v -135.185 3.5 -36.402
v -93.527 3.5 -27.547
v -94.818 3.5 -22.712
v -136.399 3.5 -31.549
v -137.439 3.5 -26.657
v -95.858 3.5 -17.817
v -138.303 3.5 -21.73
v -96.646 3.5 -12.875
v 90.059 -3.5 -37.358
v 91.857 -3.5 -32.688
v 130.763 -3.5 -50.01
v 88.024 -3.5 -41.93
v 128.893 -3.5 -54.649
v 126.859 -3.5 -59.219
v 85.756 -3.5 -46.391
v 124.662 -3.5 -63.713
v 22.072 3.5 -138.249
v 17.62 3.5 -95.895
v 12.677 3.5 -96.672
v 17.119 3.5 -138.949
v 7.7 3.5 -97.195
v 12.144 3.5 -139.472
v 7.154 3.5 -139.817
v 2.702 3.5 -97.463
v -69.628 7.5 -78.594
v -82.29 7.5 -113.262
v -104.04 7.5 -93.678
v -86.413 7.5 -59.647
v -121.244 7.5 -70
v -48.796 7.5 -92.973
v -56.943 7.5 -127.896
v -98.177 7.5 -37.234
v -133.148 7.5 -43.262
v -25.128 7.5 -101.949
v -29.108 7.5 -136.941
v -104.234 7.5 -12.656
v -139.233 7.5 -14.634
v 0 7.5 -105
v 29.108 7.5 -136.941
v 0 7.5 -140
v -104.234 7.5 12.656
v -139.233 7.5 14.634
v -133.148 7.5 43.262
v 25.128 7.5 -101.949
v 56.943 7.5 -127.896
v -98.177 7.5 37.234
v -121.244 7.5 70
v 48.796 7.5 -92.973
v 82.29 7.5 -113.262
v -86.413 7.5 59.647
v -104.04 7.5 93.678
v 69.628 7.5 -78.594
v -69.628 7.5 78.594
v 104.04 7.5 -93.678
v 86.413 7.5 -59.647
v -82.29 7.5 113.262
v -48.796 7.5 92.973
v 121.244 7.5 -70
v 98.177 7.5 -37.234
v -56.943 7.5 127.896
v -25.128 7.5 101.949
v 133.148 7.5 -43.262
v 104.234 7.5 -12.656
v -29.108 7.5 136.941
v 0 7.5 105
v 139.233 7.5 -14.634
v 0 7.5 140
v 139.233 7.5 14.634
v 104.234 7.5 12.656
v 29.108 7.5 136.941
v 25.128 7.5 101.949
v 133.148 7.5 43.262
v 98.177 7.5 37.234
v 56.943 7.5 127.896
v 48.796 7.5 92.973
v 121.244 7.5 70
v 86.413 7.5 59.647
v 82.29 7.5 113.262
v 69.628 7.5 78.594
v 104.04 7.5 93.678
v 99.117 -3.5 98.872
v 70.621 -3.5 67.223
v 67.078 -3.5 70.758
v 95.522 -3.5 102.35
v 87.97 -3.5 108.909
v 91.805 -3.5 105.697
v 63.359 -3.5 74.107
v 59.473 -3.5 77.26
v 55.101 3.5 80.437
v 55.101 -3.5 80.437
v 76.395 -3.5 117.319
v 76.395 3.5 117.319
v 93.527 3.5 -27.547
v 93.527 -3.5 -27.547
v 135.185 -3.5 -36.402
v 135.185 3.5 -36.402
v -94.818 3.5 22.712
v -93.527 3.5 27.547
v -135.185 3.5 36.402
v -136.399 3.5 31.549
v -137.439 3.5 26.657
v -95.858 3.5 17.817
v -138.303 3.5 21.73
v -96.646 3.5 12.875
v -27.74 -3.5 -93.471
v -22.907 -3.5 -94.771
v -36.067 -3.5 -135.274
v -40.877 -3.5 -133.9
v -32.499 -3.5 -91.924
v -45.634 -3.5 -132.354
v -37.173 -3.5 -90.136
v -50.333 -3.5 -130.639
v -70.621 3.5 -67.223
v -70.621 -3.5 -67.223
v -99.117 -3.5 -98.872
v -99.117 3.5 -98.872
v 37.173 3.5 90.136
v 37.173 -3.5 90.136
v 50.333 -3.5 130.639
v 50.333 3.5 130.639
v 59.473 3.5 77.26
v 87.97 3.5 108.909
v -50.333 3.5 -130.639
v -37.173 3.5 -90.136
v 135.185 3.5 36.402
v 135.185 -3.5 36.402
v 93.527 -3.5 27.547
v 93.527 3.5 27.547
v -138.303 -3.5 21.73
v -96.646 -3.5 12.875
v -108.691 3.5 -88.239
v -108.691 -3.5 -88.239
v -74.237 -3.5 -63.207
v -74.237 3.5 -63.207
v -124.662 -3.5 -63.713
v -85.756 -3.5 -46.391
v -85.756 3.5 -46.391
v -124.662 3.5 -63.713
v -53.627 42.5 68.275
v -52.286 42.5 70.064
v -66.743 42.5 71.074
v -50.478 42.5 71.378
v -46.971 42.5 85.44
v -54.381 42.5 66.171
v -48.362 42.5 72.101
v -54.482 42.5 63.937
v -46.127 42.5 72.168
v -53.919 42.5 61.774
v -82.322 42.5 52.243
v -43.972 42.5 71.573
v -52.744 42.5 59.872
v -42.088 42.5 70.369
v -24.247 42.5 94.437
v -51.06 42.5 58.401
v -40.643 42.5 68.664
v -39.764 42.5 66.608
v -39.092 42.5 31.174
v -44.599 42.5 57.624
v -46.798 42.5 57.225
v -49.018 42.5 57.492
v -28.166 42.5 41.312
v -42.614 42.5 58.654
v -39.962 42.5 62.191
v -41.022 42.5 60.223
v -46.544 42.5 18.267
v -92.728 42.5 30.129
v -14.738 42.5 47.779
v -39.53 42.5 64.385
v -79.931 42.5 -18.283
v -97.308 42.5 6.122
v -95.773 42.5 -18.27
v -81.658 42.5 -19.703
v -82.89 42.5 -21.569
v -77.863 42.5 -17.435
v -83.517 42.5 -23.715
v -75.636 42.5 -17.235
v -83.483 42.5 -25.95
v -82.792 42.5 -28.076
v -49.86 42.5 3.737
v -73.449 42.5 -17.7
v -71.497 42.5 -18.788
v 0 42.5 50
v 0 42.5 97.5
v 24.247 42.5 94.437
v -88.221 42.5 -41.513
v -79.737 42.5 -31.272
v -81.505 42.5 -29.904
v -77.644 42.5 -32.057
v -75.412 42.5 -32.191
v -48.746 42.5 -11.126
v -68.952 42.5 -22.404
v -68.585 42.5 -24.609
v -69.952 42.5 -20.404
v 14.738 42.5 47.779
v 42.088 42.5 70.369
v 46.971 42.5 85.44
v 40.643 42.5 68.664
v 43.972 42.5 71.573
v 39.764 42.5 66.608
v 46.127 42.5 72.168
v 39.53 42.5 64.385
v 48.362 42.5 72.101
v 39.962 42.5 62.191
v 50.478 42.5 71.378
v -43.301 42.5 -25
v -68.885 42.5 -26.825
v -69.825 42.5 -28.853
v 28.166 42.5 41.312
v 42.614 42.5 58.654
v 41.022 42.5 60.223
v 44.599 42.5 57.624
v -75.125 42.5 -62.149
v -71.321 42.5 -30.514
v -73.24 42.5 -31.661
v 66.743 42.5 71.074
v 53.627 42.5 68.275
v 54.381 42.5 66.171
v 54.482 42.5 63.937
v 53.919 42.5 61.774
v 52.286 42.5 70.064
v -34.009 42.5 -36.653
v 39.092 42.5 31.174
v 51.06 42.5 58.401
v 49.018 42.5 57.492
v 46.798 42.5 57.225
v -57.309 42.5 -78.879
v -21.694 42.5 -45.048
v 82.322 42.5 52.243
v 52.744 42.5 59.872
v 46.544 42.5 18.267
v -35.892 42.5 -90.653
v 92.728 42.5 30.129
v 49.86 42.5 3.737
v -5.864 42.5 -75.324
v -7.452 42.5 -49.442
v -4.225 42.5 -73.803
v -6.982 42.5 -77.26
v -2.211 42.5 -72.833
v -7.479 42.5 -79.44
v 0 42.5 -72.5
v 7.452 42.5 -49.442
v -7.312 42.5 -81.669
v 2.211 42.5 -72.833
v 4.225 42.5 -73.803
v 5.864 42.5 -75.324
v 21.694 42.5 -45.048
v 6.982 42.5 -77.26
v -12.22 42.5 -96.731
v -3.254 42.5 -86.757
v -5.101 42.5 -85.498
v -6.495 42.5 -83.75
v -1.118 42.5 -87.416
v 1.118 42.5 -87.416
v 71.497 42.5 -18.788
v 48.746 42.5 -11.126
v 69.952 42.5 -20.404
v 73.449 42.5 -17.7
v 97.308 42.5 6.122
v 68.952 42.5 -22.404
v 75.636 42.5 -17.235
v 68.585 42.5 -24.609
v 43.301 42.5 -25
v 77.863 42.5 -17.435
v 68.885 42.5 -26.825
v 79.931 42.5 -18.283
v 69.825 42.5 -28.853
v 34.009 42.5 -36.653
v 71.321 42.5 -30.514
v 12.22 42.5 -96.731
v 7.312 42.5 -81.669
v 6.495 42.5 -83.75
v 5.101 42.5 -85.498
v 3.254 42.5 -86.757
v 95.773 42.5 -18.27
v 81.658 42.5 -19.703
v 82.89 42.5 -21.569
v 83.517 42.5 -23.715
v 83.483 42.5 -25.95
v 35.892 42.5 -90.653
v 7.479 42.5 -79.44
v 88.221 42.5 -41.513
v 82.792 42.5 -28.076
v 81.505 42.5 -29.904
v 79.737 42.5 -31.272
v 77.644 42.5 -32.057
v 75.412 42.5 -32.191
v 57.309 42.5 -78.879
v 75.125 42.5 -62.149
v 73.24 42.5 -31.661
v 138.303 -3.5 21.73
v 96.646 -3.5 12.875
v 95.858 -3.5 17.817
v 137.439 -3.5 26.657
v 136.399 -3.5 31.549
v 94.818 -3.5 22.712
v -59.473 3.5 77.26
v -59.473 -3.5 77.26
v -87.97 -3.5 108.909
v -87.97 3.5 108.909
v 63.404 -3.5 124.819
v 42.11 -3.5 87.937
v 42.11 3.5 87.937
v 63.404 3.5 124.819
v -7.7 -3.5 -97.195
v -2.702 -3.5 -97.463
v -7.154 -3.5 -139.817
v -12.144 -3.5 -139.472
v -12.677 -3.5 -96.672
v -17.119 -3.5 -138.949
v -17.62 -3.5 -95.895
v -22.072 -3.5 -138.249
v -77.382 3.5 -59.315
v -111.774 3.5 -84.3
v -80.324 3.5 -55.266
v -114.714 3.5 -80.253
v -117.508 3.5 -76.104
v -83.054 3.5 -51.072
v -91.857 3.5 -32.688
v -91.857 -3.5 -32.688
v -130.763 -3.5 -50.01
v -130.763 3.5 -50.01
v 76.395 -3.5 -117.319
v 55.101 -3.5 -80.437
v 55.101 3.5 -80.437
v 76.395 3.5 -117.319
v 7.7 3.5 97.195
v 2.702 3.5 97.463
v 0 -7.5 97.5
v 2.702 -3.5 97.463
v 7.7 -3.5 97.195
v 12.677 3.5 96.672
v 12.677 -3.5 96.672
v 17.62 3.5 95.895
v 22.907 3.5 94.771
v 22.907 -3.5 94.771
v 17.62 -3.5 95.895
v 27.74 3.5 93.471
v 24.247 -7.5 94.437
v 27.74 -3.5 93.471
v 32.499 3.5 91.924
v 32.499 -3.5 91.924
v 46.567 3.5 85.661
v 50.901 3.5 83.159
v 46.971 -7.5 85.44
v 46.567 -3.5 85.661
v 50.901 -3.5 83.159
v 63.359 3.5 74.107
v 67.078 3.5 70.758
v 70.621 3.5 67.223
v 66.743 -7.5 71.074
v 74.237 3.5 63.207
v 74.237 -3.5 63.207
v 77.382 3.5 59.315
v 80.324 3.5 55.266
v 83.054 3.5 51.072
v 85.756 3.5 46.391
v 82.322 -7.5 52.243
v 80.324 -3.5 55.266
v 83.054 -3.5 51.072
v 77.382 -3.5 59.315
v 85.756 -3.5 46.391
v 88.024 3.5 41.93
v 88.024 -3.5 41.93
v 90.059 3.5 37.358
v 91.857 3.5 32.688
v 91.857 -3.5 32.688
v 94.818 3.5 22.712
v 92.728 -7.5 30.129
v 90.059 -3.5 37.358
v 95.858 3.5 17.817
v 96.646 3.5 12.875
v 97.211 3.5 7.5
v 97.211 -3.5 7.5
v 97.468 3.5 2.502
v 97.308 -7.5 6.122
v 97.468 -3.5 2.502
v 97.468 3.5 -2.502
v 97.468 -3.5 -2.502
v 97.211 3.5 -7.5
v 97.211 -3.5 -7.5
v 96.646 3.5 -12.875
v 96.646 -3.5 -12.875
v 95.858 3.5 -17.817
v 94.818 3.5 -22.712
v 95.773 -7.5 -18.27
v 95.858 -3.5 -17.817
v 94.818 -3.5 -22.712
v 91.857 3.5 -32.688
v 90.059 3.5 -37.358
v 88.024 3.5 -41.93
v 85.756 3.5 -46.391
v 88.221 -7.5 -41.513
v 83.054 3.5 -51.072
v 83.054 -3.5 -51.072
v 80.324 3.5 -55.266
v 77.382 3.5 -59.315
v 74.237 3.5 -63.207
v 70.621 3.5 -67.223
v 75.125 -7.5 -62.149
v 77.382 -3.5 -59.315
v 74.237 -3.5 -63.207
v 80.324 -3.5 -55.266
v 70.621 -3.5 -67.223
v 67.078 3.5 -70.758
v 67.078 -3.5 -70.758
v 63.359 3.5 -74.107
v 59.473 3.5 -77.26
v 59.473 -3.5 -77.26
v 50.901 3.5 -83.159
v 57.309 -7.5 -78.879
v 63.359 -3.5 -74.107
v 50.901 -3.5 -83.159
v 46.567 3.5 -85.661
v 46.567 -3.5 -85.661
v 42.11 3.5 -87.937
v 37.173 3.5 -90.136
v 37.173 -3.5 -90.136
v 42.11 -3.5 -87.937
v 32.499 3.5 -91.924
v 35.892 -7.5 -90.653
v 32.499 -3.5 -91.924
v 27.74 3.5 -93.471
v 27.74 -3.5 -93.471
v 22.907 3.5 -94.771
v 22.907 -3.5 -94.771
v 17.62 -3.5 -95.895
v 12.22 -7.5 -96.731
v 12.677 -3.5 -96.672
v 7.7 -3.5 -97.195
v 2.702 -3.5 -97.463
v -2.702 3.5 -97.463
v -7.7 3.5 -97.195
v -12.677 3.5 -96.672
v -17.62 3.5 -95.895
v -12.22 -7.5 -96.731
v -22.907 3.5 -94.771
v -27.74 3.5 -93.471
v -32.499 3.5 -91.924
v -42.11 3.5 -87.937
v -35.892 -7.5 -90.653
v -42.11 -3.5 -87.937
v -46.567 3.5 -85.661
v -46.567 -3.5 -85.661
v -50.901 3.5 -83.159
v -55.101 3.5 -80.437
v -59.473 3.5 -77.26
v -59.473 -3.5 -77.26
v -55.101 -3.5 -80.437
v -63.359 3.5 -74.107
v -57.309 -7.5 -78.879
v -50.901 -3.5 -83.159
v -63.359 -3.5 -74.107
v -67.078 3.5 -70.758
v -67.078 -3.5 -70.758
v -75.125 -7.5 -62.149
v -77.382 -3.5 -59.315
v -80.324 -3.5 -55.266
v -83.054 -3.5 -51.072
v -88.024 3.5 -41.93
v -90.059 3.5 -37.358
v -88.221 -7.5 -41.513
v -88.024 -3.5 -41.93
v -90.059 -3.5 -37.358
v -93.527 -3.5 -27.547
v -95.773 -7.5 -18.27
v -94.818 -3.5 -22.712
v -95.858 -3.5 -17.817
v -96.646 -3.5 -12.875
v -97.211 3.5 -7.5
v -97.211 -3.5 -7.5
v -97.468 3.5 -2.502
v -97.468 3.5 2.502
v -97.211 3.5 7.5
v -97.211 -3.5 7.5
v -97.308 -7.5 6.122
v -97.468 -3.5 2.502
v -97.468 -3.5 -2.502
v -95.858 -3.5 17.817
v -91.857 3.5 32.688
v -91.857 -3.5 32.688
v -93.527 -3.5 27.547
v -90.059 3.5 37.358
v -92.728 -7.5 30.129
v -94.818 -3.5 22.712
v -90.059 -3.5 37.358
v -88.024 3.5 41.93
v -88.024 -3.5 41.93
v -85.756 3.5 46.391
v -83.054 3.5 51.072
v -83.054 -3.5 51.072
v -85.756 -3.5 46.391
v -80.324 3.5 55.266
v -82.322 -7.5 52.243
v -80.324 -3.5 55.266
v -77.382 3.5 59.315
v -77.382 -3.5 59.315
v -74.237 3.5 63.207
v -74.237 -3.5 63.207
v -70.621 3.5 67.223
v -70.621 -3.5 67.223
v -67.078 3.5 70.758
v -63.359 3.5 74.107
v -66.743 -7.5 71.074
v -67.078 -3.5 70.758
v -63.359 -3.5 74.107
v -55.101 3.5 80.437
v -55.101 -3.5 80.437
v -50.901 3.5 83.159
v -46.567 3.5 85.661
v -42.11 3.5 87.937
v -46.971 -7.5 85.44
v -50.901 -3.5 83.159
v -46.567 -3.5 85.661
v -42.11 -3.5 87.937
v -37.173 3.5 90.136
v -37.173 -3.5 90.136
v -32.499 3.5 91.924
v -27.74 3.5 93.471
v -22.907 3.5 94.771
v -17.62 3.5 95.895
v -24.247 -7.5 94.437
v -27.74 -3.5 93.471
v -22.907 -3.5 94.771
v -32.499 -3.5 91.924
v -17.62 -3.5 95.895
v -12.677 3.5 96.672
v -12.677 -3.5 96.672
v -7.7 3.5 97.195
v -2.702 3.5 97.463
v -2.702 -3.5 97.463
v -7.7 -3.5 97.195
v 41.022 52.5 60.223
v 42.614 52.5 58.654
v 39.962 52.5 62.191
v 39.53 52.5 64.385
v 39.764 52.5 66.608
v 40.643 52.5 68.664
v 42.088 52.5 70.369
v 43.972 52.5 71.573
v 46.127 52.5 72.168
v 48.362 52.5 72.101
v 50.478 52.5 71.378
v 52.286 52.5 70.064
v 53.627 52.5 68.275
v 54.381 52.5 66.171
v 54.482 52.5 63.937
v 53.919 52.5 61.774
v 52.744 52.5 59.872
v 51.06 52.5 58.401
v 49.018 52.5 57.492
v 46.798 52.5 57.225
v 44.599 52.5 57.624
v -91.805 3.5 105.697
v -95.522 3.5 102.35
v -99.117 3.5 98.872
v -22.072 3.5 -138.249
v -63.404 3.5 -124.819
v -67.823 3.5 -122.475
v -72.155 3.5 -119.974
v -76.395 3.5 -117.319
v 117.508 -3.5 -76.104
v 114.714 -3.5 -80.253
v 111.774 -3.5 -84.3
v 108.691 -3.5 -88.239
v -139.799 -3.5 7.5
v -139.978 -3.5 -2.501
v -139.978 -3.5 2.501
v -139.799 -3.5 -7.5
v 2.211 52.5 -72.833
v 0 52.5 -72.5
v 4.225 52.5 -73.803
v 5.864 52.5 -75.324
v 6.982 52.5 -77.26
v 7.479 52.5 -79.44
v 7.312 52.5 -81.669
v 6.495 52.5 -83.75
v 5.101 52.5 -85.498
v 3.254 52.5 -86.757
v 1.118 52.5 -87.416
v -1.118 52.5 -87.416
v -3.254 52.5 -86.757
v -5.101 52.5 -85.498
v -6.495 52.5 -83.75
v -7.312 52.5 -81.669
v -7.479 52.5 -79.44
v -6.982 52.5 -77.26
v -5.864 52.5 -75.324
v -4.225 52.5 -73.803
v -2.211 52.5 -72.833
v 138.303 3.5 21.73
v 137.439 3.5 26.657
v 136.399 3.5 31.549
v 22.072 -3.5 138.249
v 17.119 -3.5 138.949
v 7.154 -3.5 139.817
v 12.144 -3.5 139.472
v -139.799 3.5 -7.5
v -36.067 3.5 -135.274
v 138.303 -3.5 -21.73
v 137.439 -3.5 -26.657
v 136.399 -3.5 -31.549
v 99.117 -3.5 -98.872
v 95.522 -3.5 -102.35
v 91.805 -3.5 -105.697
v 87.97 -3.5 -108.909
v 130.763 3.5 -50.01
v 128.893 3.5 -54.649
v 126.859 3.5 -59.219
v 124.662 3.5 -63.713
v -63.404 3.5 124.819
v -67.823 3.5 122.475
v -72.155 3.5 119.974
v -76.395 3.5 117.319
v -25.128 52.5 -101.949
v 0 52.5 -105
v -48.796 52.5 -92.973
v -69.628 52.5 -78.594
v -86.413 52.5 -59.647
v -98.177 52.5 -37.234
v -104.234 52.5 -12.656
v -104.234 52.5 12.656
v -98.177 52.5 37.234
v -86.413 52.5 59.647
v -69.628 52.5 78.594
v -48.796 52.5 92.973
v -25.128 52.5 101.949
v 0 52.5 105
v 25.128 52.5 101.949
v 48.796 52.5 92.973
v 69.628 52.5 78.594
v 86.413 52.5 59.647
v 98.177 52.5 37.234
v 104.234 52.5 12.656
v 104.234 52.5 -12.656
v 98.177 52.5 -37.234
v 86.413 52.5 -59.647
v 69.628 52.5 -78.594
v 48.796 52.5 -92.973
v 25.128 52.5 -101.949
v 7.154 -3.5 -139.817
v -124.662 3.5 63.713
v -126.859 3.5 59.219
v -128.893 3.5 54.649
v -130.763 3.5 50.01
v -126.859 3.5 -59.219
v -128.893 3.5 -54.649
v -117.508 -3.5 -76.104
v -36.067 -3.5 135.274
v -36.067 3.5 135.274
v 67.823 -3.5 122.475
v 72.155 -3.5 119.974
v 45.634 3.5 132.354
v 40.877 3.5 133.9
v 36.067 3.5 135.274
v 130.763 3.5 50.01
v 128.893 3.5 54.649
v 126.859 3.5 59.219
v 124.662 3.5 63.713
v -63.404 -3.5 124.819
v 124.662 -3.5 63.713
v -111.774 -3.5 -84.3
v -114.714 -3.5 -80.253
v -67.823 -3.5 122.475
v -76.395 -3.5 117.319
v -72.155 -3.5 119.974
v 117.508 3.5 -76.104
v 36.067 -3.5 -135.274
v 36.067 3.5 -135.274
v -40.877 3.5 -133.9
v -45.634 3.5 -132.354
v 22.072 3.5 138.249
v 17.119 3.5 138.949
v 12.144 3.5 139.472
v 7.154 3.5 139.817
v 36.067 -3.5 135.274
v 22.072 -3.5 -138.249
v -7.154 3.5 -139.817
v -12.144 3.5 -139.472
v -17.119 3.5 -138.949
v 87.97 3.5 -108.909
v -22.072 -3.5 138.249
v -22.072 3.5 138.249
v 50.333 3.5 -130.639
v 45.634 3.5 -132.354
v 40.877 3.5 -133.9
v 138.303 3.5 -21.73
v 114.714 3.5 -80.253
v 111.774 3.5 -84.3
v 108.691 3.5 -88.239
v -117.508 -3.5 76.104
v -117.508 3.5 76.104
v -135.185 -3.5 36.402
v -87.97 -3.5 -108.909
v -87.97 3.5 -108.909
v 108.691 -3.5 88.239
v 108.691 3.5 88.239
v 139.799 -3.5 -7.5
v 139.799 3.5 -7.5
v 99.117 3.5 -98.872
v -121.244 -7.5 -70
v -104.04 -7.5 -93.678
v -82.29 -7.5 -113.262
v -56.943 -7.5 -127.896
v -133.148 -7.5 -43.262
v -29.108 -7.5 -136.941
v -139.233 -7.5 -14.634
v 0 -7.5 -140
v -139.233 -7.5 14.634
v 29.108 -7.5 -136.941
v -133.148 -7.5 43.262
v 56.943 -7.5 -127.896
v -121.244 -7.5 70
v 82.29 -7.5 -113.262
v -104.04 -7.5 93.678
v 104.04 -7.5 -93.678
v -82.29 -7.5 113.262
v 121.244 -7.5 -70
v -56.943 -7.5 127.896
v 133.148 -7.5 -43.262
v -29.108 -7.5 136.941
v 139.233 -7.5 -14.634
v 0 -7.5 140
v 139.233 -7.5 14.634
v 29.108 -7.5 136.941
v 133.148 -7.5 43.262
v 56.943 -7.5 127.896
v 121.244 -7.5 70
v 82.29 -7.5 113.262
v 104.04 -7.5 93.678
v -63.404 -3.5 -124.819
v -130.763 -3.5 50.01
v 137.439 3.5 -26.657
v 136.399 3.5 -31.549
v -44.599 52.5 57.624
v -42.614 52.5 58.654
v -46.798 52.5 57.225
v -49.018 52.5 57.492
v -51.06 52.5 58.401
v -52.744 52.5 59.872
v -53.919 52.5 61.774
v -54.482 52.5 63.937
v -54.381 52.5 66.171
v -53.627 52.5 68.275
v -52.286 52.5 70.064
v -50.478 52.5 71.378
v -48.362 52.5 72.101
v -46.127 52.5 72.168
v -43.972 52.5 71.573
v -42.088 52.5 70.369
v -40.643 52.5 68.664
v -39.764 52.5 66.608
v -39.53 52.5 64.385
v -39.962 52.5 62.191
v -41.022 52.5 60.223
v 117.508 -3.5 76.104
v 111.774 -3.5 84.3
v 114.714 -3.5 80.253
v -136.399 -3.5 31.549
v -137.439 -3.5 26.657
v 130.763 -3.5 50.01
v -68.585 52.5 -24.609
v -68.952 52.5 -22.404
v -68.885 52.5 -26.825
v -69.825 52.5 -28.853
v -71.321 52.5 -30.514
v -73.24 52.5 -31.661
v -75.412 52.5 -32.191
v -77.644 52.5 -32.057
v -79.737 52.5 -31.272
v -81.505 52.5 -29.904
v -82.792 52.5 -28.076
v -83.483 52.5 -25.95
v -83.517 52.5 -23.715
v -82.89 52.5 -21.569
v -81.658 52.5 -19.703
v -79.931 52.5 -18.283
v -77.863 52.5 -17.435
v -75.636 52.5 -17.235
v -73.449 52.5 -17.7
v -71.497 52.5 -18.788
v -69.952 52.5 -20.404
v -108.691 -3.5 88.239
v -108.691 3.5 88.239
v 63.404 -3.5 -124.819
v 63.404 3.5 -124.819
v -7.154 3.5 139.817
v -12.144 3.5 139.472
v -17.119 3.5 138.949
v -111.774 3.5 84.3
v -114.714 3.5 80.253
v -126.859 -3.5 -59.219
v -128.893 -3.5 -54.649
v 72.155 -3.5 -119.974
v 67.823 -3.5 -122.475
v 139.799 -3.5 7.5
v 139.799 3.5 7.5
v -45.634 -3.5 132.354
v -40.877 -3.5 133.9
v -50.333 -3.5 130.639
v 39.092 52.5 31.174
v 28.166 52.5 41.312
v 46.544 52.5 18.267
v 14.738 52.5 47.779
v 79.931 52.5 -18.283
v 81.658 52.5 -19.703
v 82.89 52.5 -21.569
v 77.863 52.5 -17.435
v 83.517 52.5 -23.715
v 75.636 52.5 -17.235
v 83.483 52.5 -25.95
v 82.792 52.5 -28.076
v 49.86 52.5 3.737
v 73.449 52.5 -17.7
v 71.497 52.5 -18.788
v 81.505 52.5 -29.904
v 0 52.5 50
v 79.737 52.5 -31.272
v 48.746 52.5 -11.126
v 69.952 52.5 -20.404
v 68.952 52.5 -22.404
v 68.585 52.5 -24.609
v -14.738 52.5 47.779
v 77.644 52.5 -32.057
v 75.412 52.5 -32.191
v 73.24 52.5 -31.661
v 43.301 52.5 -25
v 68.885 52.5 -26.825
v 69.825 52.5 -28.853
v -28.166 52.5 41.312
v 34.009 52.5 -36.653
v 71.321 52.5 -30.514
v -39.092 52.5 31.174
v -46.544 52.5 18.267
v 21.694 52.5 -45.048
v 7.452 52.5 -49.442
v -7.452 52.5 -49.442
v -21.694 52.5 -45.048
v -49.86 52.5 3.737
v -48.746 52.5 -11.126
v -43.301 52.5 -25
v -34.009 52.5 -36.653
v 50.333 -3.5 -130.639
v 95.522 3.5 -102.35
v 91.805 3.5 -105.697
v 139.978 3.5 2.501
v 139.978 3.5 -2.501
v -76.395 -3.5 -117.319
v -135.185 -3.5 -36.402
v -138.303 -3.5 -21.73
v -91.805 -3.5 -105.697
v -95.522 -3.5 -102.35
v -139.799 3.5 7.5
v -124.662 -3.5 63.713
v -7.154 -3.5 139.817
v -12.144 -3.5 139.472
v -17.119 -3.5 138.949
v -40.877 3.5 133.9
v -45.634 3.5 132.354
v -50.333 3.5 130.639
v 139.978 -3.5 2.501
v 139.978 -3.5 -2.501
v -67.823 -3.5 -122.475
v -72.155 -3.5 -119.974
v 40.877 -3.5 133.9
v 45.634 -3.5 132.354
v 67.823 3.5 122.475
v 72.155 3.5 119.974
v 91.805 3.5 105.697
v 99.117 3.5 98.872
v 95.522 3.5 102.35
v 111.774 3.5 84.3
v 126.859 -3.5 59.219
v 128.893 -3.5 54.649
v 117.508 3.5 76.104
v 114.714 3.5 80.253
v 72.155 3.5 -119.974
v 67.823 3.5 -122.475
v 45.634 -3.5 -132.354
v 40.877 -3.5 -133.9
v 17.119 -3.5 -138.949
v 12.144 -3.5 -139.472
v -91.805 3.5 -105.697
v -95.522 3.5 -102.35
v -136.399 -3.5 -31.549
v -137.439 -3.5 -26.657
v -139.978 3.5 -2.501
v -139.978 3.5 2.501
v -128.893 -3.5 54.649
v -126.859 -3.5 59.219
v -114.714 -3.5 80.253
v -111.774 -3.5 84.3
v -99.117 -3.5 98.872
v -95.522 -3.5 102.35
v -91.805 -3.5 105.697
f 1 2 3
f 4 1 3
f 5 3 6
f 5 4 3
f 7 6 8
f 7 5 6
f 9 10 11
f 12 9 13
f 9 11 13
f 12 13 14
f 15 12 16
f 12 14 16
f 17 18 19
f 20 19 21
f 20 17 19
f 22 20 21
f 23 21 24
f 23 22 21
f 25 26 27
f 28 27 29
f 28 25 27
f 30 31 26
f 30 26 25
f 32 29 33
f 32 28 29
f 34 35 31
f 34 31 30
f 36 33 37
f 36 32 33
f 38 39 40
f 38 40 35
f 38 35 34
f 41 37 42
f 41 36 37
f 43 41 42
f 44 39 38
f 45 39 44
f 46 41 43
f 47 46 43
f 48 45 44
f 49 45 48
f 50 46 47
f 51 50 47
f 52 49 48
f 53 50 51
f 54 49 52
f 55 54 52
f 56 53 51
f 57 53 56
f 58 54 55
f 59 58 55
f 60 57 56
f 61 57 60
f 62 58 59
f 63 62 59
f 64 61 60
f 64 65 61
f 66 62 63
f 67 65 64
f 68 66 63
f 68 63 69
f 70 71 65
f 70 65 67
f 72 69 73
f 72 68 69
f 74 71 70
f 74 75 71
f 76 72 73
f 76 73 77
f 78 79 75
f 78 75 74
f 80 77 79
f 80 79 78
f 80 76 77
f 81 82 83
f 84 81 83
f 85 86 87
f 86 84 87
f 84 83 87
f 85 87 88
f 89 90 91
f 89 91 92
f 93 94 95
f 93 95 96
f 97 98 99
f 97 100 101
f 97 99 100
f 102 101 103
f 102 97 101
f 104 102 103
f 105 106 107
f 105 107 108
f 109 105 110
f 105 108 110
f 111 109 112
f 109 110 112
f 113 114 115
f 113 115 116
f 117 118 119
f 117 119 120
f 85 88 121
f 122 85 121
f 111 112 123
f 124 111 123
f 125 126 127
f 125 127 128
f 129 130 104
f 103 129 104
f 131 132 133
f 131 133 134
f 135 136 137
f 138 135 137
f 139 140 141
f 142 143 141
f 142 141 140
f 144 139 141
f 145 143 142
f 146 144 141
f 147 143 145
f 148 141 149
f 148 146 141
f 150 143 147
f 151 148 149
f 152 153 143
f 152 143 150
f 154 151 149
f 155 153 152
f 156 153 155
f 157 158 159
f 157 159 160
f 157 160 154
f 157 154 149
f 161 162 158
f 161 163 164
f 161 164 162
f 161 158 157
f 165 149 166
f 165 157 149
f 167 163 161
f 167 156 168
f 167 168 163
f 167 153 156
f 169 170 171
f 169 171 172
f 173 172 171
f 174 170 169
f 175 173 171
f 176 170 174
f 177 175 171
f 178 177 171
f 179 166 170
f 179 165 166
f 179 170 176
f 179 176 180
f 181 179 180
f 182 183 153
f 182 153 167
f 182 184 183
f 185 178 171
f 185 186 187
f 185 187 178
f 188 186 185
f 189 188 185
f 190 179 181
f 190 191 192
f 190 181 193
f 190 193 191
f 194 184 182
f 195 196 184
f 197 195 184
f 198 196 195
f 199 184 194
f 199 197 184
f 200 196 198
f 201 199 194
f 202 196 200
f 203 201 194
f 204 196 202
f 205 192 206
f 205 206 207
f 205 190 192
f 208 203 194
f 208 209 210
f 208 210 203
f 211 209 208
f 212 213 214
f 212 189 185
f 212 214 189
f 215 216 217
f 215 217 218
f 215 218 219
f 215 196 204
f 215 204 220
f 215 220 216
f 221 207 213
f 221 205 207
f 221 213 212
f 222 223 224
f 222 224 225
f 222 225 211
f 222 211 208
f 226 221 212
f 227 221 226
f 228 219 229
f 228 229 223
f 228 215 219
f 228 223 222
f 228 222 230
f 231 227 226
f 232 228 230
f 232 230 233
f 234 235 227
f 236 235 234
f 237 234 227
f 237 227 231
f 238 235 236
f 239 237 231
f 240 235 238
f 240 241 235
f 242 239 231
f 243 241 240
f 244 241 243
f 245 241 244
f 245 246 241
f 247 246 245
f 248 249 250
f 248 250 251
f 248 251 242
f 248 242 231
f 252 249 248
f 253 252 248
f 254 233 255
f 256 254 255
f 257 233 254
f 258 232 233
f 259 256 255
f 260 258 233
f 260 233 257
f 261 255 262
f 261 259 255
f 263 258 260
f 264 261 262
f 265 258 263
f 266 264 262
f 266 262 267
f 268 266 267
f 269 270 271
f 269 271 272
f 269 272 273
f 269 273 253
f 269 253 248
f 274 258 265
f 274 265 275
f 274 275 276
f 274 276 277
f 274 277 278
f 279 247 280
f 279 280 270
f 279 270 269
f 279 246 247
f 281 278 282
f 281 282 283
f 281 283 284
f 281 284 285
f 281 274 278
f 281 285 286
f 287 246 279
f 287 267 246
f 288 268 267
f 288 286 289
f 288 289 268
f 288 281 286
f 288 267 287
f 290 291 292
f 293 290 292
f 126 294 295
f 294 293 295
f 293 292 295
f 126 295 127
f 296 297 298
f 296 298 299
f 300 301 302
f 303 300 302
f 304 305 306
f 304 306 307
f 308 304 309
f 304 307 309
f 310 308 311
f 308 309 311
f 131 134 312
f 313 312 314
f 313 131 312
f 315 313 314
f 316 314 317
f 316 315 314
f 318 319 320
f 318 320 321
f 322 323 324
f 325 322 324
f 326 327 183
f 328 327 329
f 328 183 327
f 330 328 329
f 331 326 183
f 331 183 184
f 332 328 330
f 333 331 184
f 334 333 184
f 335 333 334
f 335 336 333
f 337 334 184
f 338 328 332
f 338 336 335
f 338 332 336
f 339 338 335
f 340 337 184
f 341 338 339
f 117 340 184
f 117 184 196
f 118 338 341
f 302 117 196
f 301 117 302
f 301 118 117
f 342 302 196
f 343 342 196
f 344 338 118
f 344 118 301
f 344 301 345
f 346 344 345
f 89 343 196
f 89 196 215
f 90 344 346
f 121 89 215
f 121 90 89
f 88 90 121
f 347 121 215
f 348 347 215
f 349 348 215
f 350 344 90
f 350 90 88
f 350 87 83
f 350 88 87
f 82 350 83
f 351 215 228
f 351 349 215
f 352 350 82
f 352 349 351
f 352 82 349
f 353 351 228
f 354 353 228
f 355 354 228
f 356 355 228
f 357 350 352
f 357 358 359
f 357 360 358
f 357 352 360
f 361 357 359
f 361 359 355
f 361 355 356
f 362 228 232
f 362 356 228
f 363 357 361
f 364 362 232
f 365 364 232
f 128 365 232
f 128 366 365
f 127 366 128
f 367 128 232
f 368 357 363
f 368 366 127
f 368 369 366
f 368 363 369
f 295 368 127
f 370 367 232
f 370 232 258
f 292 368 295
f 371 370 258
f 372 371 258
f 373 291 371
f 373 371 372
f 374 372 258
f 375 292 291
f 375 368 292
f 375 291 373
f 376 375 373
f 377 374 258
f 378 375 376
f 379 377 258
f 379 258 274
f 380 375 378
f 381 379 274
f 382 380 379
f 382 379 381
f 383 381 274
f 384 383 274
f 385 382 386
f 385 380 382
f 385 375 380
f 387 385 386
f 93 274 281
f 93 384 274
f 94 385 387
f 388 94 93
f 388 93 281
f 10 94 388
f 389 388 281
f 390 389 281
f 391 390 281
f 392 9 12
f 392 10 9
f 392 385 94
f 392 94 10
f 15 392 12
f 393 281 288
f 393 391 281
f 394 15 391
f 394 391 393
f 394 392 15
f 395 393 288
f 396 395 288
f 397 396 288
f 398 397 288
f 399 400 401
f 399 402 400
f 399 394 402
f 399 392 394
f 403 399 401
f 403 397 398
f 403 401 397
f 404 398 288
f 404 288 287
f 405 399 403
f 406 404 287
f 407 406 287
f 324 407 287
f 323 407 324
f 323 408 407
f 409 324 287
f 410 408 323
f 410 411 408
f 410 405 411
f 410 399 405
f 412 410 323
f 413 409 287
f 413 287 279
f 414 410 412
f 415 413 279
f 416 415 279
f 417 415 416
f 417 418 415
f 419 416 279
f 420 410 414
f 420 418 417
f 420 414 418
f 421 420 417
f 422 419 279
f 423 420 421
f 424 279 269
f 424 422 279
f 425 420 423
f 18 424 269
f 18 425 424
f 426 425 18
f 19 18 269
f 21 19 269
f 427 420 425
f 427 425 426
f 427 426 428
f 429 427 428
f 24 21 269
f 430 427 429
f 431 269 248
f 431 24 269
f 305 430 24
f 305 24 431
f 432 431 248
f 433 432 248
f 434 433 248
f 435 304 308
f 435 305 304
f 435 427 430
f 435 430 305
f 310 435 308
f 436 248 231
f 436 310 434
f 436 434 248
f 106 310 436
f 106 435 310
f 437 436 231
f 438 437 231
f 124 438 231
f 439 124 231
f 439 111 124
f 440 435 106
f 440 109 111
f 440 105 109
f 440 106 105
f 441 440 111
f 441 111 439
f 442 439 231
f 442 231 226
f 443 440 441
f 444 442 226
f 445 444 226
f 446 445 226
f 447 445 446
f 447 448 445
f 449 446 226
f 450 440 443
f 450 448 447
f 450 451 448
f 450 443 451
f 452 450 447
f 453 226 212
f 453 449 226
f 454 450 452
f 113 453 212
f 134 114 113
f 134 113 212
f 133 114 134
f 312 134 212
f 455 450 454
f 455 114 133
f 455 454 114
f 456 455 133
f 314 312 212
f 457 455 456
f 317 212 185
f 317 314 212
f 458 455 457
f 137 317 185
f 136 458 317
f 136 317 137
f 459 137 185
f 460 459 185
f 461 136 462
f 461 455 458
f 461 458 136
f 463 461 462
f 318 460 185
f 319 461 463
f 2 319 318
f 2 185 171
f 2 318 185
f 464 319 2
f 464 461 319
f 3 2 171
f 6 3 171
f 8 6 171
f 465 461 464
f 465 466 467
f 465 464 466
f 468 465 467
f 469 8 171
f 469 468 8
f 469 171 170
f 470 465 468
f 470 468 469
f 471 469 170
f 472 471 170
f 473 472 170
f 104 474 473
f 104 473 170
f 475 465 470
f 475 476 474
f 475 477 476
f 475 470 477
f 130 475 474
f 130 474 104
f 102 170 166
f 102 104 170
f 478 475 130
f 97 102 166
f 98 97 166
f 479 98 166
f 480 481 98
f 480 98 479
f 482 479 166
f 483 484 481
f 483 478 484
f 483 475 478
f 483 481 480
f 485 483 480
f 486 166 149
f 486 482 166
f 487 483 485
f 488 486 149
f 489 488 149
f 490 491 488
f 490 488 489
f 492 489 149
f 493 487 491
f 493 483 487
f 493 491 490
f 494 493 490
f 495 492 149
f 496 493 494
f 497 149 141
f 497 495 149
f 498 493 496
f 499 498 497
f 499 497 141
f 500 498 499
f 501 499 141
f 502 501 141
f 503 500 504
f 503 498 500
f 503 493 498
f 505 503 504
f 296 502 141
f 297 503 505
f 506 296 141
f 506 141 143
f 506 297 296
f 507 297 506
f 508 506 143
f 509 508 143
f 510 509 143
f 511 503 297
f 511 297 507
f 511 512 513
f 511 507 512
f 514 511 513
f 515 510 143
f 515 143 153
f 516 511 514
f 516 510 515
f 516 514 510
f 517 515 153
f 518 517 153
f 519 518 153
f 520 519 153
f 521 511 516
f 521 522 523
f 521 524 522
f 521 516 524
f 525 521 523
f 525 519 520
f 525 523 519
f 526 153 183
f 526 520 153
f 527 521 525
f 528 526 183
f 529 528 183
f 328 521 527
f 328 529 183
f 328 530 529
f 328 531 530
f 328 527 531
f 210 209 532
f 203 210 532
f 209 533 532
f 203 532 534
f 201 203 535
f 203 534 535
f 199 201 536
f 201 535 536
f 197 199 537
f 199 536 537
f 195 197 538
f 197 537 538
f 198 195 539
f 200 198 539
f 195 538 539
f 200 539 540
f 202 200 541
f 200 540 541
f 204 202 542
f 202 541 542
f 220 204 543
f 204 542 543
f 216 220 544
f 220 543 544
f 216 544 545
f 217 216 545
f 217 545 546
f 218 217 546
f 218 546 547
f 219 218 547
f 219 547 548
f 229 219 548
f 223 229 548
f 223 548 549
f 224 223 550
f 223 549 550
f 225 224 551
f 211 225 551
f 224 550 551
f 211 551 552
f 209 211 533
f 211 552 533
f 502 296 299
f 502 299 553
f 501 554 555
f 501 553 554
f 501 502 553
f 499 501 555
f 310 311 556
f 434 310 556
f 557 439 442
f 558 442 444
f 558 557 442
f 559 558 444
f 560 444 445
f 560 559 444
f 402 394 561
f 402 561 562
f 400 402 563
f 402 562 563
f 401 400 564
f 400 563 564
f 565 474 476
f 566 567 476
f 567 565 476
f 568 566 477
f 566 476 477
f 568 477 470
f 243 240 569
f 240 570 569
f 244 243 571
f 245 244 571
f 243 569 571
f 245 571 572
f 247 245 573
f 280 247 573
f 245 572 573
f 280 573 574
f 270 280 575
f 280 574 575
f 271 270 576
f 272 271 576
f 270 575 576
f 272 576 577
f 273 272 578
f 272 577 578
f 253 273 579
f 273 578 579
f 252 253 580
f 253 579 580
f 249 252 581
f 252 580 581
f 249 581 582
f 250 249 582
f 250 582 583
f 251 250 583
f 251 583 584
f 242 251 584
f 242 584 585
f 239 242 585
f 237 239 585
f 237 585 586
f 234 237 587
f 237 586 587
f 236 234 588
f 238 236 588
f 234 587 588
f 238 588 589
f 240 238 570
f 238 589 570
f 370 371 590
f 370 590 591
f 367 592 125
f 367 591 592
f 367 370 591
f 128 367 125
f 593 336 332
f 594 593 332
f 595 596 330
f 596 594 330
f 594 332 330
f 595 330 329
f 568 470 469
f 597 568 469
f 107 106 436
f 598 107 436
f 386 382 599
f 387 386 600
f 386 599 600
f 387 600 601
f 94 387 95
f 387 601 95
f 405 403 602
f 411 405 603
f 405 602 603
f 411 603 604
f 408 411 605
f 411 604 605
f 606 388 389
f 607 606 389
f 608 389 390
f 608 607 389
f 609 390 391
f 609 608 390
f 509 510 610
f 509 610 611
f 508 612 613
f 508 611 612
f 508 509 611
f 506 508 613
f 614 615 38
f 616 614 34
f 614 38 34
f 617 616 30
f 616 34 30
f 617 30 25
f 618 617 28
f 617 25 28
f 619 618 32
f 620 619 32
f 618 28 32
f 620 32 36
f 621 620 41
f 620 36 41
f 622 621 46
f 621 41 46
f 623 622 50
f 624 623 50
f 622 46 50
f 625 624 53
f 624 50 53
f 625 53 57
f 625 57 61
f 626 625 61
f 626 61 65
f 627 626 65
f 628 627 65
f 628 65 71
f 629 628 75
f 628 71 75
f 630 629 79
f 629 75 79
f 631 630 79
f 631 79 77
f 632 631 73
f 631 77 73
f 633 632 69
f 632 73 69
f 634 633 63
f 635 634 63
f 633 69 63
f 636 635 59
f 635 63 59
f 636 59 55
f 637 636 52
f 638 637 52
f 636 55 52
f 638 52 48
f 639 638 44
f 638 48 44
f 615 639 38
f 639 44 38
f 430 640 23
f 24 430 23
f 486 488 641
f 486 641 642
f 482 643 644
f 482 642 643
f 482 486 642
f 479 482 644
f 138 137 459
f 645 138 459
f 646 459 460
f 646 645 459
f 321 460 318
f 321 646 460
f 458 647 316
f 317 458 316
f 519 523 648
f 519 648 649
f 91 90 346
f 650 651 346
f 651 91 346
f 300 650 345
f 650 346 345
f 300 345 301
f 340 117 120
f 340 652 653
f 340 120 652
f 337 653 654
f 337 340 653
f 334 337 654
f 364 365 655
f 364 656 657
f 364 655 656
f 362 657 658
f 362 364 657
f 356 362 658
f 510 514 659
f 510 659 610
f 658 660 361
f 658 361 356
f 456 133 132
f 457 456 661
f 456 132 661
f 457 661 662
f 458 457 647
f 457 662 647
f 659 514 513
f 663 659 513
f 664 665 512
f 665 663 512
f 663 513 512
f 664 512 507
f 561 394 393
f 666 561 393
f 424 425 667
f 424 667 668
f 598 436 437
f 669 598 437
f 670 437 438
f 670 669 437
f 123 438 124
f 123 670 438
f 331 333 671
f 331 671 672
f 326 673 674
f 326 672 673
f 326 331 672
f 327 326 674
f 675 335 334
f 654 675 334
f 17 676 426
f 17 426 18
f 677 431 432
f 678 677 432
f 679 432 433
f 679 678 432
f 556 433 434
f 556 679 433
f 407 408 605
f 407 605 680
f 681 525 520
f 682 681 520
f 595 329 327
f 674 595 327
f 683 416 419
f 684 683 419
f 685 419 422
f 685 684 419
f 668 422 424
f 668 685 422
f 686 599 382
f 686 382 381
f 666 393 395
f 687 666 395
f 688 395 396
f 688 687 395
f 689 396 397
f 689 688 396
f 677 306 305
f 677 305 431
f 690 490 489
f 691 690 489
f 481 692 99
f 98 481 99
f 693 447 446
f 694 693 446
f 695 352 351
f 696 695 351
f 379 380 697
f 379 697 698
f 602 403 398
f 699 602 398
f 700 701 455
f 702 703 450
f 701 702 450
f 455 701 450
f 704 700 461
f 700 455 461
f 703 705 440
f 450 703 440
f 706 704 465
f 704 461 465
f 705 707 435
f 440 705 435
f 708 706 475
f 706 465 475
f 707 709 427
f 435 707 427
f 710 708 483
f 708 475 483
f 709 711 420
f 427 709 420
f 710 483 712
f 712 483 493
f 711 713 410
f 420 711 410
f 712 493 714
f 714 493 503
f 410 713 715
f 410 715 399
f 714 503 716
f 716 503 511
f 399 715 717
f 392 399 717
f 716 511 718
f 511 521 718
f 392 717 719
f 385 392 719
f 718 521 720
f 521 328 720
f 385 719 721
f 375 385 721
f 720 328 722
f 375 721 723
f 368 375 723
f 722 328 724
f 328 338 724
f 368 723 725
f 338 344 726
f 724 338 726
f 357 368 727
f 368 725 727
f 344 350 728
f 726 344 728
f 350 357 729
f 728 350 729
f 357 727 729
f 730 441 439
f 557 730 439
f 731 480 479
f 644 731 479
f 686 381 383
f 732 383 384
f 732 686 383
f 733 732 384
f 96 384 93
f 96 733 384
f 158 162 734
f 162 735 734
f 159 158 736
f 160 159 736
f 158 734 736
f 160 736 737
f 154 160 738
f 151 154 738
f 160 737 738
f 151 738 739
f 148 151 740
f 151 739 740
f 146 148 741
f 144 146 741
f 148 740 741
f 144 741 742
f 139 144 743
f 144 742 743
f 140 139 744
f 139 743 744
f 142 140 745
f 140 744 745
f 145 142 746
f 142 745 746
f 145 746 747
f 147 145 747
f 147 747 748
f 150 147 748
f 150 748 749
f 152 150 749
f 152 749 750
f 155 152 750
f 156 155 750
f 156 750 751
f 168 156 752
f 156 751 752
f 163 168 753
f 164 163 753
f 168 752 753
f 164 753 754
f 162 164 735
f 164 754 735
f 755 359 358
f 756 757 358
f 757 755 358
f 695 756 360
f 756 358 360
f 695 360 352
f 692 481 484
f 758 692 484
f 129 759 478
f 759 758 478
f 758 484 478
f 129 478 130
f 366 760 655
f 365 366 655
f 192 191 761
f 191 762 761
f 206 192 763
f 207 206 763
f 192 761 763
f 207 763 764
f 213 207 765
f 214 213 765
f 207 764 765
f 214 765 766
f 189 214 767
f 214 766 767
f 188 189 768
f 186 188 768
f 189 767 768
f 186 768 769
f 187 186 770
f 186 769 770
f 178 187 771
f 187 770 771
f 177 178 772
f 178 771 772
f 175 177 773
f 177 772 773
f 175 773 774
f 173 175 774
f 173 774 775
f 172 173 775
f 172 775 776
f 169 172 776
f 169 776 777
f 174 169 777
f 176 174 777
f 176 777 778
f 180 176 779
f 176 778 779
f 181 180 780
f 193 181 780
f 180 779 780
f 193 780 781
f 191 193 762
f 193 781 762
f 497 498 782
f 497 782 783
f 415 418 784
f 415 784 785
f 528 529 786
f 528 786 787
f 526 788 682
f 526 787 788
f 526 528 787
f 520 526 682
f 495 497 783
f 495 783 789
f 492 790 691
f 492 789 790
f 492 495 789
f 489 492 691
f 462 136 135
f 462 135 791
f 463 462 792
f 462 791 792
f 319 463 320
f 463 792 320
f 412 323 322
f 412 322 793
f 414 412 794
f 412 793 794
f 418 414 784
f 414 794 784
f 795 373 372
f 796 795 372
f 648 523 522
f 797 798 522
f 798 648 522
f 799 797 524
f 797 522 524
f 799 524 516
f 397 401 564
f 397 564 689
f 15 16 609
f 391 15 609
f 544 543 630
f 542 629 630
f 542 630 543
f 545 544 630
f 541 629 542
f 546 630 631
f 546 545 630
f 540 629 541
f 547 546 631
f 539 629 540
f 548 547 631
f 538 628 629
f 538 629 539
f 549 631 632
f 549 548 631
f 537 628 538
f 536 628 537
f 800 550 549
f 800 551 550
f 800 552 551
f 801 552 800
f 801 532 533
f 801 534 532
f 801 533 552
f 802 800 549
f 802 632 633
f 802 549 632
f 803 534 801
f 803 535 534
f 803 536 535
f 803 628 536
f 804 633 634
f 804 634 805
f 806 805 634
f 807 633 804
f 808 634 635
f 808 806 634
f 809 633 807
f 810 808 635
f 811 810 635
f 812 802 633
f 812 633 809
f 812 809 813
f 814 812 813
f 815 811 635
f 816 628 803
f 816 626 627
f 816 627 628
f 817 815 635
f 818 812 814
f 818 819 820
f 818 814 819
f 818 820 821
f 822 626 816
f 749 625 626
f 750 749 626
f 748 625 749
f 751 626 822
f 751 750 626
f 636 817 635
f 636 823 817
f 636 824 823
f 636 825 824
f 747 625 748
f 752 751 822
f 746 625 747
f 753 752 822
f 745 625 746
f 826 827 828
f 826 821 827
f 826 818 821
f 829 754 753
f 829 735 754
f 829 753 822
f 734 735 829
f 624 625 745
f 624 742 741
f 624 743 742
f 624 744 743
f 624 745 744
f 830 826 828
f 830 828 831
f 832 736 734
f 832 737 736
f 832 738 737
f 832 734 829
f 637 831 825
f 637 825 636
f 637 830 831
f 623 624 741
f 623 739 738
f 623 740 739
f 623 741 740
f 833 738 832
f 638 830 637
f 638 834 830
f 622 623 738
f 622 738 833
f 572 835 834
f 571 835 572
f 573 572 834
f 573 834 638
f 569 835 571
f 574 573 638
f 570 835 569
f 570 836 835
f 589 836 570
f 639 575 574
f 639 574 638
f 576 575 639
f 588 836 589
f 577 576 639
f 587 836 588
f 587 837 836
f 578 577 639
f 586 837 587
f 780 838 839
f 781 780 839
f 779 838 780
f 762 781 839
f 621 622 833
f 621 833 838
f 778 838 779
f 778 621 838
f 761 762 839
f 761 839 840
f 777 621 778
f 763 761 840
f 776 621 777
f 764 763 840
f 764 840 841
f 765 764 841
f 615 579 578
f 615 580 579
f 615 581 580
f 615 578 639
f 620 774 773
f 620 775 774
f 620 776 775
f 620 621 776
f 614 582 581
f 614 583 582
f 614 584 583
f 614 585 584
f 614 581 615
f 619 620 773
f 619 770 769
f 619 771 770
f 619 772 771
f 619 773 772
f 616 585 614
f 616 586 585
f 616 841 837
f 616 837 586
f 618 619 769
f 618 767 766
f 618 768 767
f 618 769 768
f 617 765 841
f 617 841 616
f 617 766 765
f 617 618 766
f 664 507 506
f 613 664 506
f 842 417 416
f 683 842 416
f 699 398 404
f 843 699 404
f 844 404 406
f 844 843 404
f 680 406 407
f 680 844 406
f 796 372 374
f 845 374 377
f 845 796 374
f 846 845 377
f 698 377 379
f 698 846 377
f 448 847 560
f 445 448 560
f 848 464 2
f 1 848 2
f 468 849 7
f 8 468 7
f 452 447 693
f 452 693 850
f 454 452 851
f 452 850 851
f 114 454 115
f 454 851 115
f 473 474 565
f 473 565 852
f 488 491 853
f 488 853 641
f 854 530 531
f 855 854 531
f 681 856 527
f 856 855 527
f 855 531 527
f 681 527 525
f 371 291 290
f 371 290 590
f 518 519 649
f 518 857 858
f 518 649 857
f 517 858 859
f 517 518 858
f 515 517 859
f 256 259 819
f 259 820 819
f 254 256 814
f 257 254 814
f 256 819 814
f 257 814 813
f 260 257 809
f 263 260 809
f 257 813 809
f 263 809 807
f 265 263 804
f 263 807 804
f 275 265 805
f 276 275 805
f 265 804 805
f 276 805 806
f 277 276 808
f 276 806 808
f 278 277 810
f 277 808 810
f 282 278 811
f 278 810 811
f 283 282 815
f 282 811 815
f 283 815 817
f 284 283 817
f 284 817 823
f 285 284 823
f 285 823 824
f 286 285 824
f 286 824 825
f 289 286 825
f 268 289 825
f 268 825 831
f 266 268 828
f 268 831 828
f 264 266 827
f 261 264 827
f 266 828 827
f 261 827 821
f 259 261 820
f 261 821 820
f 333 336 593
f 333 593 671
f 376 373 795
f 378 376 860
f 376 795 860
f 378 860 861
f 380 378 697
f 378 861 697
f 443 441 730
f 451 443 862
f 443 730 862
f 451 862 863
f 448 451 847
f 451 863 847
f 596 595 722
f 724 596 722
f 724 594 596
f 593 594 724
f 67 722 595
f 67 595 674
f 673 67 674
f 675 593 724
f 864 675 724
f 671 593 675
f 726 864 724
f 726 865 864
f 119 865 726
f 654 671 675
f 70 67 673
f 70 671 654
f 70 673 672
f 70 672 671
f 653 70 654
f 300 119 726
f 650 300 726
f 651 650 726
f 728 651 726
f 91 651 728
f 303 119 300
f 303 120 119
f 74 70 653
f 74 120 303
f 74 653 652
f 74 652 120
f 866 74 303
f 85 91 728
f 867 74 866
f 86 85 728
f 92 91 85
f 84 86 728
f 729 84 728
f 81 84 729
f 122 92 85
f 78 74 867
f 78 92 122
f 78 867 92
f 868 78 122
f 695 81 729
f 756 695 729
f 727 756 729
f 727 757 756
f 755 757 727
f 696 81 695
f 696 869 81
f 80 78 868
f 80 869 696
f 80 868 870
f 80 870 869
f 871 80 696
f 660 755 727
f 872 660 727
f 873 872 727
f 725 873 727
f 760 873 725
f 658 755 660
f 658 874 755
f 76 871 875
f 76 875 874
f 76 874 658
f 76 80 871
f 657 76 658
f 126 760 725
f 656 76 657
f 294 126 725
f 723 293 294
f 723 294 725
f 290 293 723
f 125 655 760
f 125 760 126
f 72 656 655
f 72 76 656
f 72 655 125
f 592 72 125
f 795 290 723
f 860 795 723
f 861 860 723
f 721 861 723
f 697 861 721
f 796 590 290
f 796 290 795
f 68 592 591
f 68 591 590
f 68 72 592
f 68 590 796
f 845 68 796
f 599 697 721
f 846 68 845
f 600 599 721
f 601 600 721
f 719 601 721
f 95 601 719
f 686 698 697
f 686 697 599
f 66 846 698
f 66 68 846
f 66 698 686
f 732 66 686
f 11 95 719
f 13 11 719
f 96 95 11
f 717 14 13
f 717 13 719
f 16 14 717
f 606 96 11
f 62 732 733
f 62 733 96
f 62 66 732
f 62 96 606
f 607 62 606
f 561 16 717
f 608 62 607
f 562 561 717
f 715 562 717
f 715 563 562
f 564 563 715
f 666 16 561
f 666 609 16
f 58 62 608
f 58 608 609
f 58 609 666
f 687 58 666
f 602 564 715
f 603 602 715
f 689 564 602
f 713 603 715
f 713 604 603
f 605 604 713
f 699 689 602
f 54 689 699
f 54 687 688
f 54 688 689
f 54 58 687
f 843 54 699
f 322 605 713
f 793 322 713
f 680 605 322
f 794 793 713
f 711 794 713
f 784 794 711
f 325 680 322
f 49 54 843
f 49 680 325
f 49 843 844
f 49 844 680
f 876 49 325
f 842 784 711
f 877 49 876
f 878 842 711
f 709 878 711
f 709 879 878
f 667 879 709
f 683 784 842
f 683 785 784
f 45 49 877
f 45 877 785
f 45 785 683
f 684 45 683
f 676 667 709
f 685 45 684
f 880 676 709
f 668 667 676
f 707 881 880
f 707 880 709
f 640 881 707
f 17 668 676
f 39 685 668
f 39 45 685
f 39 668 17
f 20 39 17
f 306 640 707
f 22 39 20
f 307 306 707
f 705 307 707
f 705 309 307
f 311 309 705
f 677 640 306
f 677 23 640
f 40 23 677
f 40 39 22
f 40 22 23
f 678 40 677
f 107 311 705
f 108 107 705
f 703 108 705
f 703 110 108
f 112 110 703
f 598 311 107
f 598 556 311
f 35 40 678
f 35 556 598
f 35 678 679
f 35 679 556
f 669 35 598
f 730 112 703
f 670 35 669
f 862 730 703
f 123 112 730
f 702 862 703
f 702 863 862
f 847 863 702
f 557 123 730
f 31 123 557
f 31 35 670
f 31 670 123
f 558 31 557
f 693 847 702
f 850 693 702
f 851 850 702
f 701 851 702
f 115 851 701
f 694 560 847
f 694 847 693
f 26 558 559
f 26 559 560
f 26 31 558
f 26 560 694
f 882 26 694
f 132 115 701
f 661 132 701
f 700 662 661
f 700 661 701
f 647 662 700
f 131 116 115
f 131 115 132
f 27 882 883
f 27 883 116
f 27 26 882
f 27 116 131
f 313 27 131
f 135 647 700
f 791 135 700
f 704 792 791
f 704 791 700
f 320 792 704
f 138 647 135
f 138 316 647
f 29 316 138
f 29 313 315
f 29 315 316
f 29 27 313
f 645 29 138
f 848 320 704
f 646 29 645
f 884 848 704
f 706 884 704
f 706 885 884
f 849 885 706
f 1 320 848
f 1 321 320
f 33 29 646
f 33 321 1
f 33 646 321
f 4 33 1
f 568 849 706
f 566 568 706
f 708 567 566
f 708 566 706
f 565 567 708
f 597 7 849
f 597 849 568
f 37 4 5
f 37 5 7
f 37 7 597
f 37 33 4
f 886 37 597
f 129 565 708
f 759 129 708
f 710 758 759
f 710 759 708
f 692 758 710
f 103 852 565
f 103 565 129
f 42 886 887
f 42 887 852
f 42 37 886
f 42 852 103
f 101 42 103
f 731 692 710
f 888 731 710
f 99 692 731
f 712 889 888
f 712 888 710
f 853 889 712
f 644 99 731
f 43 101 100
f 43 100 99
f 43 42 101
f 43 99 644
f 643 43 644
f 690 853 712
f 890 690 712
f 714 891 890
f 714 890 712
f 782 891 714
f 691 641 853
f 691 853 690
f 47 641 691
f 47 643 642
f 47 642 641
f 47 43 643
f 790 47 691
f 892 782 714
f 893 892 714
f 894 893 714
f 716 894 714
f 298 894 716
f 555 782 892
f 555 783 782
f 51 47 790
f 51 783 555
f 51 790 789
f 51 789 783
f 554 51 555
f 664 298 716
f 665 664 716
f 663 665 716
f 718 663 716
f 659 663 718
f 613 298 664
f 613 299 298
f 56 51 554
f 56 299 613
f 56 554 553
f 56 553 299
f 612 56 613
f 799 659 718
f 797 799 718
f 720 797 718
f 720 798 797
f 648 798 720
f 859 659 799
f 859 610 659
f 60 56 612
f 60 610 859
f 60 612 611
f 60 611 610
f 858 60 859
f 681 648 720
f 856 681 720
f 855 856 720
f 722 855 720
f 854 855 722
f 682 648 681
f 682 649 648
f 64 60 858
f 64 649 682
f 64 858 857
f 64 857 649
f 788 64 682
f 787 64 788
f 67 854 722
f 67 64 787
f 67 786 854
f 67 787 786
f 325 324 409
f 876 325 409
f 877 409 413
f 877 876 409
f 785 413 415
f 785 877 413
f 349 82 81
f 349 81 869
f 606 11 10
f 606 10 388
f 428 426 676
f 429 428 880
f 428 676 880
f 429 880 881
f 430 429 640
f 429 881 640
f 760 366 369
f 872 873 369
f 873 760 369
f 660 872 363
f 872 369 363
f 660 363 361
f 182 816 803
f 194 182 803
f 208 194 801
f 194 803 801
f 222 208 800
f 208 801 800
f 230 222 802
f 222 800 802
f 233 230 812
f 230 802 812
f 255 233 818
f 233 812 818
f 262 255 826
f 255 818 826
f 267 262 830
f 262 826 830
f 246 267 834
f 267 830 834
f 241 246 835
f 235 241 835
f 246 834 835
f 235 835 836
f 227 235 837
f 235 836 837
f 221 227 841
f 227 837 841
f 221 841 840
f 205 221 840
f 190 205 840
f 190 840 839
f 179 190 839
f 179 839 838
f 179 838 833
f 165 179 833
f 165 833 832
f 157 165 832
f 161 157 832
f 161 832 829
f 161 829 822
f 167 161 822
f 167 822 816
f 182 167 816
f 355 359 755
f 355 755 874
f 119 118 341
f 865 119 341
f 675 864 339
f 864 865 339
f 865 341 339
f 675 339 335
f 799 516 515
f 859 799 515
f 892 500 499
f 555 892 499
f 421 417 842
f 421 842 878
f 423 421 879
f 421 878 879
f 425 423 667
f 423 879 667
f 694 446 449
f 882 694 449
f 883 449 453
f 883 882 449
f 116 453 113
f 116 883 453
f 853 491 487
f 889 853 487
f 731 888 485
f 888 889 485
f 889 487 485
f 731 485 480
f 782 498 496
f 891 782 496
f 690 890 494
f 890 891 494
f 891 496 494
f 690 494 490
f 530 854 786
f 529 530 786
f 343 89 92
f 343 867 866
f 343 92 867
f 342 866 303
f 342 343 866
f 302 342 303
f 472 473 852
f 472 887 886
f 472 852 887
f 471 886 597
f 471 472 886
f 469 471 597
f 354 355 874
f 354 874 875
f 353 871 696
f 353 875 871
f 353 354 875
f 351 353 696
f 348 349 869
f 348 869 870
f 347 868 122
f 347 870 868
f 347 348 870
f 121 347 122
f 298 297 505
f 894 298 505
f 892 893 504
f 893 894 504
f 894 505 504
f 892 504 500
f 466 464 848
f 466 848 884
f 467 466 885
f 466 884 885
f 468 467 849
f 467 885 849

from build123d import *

# Parameters (mm, degrees)
SKETCH1_R               = 140
BOSS_EXTRUDE1_DEPTH     = 7.5
CUT_EXTRUDE1_DEPTH      = 199.557296517
CUT_EXTRUDE1_DEPTH_BACK = 199.557296517
SKETCH2_R               = 97.5
SKETCH3_R               = 105
BOSS_EXTRUDE2_DEPTH     = 45
SKETCH5_R               = 50
CUT_EXTRUDE2_DEPTH      = 207.881608656
SKETCH7_R               = 7.5
CUT_EXTRUDE3_DEPTH      = 207.881608656
CIRPATTERN1_COUNT       = 5
SKETCH9_W               = 15
SKETCH9_H               = 7
CUT_EXTRUDE4_DEPTH      = 318.421250076
CIRPATTERN2_COUNT       = 30
SKETCH11_R              = 96.873816077
CUT_EXTRUDE5_DEPTH      = 35
CUT_EXTRUDE6_START      = -35
SKETCH12_R              = 97.5
CUT_EXTRUDE6_DEPTH      = 35


with BuildPart() as part:
    # Sketch1 → Boss-Extrude1 (new, symmetric)
    with BuildSketch(Plane(origin=(0, 0, 0), x_dir=(1, 0, 0), z_dir=(0, 1, 0))):
        with Locations(Location((0, 0, 0), (0, 0, 270))):
            Circle(SKETCH1_R)
    extrude(amount=BOSS_EXTRUDE1_DEPTH, both=True)

    # Sketch2 → Cut-Extrude1 (cut, two sides: drawn at the far end of the back side and taken through both)
    with BuildSketch(Plane(origin=(0, 7.5, 0), x_dir=(1, 0, 0), z_dir=(0, 1, 0)).offset(-CUT_EXTRUDE1_DEPTH_BACK)):
        with Locations(Location((0, 0, 0), (0, 0, 270))):
            Circle(SKETCH2_R)
    extrude(amount=CUT_EXTRUDE1_DEPTH + CUT_EXTRUDE1_DEPTH_BACK, mode=Mode.SUBTRACT)

    # Sketch3 → Boss-Extrude2 (add)
    with BuildSketch(Plane(origin=(0, 7.5, 0), x_dir=(1, 0, 0), z_dir=(0, 1, 0))):
        with Locations(Location((0, 0, 0), (0, 0, 90))):
            Circle(SKETCH3_R)
    extrude(amount=BOSS_EXTRUDE2_DEPTH)

    # Sketch5 → Cut-Extrude2 (cut, through all)
    with BuildSketch(Plane(origin=(0, 52.5, 0), x_dir=(1, 0, 0), z_dir=(0, 1, 0))):
        with Locations(Location((0, 0, 0), (0, 0, 270))):
            Circle(SKETCH5_R)
    extrude(amount=-CUT_EXTRUDE2_DEPTH, mode=Mode.SUBTRACT)

    # Sketch7 → Cut-Extrude3 (cut, symmetric)
    with BuildSketch(Plane(origin=(0, 52.5, 0), x_dir=(1, 0, 0), z_dir=(0, 1, 0))):
        with Locations(Location((0, 80, 0), (0, 0, 270))):
            Circle(SKETCH7_R)
    cut_extrude3 = extrude(amount=CUT_EXTRUDE3_DEPTH, both=True, mode=Mode.SUBTRACT)

    # CirPattern1: Cut-Extrude3 ×5 about axis
    cirpattern1_axis = Axis((0, 0, 0), (0, 1, 0))
    for i in range(1, CIRPATTERN1_COUNT):
        add(cut_extrude3.rotate(cirpattern1_axis, i * 360 / CIRPATTERN1_COUNT), mode=Mode.SUBTRACT)

    # Sketch9 → Cut-Extrude4 (cut, symmetric)
    with BuildSketch(Plane(origin=(140, 0, 0), x_dir=(0, 0, -1), z_dir=(1, 0, 0))):
        Rectangle(SKETCH9_W, SKETCH9_H)
    cut_extrude4 = extrude(amount=CUT_EXTRUDE4_DEPTH, both=True, mode=Mode.SUBTRACT)

    # CirPattern2: Cut-Extrude4 ×30 about axis
    cirpattern2_axis = Axis((0, 0, 0), (0, 1, 0))
    for i in range(1, CIRPATTERN2_COUNT):
        add(cut_extrude4.rotate(cirpattern2_axis, i * 360 / CIRPATTERN2_COUNT), mode=Mode.SUBTRACT)

    # Sketch11 → Cut-Extrude5 (cut)
    with BuildSketch(Plane.XZ.offset(-7.5)):
        with Locations(Location((0, 0, 0), (0, 0, 270))):
            Circle(SKETCH11_R)
    extrude(amount=-CUT_EXTRUDE5_DEPTH, mode=Mode.SUBTRACT)

    # Sketch12 → Cut-Extrude6 (cut)
    with BuildSketch(Plane.XZ.offset(-7.5).offset(CUT_EXTRUDE6_START)):
        with Locations(Location((0, 0, 0), (0, 0, 90))):
            Circle(SKETCH12_R)
    extrude(amount=CUT_EXTRUDE6_DEPTH, mode=Mode.SUBTRACT)


solid = part.part
